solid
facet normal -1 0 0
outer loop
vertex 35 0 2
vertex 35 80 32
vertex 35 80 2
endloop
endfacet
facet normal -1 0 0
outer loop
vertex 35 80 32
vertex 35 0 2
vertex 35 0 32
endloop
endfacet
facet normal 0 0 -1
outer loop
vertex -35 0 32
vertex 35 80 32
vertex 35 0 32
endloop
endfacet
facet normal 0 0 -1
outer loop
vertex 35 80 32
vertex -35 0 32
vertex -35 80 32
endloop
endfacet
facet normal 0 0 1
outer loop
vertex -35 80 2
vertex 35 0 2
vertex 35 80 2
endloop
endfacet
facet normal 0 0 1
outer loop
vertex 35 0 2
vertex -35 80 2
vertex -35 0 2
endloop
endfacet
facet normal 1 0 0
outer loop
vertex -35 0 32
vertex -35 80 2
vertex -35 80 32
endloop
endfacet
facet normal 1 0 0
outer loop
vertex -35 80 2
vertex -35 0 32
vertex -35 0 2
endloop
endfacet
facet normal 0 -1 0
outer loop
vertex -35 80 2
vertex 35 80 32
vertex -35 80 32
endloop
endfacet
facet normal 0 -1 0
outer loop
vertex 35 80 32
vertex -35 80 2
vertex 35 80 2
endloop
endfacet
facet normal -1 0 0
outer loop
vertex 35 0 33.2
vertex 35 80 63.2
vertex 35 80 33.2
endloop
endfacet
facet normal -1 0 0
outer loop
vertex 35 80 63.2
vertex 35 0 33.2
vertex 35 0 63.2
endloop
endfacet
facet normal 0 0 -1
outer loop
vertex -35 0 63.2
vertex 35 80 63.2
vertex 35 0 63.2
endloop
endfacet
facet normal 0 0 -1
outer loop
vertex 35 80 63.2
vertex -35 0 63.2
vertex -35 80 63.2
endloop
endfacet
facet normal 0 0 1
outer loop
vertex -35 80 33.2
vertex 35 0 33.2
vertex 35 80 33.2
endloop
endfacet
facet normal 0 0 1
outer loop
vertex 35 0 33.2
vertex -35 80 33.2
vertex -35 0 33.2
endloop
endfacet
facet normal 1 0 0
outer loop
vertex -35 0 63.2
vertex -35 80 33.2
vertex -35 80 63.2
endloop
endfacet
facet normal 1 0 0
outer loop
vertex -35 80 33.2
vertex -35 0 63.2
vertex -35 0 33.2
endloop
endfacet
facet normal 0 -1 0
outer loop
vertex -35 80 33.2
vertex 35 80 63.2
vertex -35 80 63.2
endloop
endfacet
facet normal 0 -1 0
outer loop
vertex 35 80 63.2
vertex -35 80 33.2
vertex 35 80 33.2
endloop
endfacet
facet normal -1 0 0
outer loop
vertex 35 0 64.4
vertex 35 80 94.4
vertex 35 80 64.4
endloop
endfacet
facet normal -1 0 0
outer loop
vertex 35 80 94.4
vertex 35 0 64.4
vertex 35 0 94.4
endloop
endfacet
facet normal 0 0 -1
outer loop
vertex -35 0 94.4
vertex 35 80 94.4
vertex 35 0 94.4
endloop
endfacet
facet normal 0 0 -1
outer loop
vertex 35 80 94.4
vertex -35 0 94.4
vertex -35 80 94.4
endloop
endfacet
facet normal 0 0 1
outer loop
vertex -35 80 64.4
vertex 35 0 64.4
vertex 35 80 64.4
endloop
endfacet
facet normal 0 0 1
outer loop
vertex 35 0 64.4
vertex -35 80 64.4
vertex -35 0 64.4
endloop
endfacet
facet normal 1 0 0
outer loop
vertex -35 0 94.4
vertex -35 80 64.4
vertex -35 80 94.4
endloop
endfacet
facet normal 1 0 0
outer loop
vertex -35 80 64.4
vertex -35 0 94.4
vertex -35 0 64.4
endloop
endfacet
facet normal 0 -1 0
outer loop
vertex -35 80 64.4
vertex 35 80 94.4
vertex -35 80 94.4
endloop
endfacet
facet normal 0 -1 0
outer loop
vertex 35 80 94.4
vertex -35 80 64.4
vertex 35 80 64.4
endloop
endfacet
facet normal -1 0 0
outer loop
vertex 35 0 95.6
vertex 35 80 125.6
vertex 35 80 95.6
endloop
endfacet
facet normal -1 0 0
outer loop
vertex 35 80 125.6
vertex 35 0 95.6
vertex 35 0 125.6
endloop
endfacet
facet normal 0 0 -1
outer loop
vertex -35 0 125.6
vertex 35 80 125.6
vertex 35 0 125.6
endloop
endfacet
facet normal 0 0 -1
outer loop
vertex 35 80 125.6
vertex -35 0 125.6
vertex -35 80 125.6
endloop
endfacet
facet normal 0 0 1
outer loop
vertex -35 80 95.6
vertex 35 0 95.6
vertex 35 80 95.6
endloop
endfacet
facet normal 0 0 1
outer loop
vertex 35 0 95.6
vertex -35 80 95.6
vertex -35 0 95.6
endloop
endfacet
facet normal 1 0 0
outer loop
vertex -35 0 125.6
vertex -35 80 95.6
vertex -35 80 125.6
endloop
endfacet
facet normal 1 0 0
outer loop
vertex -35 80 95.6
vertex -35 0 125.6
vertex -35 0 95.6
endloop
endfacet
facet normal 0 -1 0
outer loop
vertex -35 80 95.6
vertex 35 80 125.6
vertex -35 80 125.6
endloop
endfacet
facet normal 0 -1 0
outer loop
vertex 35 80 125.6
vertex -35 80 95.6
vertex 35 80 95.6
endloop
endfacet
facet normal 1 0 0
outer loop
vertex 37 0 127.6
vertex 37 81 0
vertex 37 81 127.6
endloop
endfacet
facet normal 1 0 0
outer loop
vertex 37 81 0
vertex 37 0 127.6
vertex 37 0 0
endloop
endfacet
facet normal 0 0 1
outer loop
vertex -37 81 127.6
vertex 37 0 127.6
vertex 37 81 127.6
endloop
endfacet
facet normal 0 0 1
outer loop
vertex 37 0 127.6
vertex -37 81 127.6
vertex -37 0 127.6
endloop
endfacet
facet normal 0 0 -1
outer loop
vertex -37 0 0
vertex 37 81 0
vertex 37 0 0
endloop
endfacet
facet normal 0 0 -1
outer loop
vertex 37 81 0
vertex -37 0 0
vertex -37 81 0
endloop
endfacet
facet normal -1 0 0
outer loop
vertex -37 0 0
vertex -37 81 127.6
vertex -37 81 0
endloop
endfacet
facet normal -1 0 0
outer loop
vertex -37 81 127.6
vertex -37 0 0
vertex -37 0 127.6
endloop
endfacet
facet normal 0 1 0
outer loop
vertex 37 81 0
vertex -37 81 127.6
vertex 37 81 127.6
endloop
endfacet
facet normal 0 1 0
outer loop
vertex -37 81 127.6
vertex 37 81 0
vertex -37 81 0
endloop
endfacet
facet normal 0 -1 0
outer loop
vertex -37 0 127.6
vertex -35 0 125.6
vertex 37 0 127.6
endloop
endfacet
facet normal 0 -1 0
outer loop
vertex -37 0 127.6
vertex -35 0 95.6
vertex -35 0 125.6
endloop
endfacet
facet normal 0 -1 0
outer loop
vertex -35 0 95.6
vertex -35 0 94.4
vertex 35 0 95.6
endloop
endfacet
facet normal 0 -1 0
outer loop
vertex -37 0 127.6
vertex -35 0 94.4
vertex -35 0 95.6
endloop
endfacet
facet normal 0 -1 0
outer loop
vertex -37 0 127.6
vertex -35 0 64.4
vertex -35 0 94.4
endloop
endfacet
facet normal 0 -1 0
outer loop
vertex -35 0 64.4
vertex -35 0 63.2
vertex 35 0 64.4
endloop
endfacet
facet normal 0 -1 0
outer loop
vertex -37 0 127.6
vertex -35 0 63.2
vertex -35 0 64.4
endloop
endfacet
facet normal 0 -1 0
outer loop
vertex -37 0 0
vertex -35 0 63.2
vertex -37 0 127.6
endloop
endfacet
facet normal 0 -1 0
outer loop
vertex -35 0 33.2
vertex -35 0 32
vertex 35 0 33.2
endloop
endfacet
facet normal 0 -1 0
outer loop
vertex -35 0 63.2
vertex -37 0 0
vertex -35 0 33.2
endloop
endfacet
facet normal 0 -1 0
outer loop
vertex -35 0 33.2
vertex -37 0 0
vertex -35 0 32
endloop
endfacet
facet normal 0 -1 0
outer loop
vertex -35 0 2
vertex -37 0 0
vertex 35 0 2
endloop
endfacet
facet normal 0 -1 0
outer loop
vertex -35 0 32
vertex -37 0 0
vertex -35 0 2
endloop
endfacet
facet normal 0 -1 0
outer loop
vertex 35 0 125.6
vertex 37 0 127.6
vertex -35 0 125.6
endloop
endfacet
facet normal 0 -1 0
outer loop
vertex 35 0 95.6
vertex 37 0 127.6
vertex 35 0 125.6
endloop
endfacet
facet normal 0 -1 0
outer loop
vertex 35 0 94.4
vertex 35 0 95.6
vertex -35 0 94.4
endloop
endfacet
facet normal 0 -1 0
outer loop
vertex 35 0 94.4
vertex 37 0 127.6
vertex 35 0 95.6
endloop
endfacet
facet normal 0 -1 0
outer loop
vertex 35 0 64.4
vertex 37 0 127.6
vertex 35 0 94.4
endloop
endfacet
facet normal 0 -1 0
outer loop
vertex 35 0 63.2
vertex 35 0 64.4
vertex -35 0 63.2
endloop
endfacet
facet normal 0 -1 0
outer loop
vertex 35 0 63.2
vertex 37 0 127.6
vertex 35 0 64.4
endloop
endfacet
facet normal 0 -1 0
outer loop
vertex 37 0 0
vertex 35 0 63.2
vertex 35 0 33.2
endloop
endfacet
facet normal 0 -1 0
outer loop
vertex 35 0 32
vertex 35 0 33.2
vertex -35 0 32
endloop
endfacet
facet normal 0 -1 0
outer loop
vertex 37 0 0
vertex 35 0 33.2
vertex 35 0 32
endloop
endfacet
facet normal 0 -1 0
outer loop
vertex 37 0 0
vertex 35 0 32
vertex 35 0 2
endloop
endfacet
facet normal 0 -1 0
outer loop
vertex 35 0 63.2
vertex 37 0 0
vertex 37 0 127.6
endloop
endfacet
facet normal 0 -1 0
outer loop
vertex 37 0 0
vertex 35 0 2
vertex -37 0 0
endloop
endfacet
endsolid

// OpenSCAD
basic_drawer_width = 70;
basic_drawer_depth = 80;
basic_drawer_walls_height = 25;
basic_drawer_full_height = 30;

module_outer_wall_thickness = 2;
module_inner_wall_thickness = 1.2;
module_back_wall_thickness = 1;

module_slot_width = basic_drawer_width;
basic_module_width = module_slot_width + module_outer_wall_thickness * 2;
module_depth = basic_drawer_depth + module_back_wall_thickness;
module_height = basic_drawer_full_height * 4 + module_outer_wall_thickness * 2 + module_inner_wall_thickness * 3;

difference() {
    translate(v = [ -basic_module_width / 2, 0, 0 ])
        cube(size = [ basic_module_width, module_depth, module_height ]);
    for (i = [0:3]) {
        translate(v = [ -module_slot_width / 2, -10, module_outer_wall_thickness + i * (basic_drawer_full_height + module_inner_wall_thickness) ])
            cube(size = [ module_slot_width, basic_drawer_depth + 10, basic_drawer_full_height ]);
    }
}
